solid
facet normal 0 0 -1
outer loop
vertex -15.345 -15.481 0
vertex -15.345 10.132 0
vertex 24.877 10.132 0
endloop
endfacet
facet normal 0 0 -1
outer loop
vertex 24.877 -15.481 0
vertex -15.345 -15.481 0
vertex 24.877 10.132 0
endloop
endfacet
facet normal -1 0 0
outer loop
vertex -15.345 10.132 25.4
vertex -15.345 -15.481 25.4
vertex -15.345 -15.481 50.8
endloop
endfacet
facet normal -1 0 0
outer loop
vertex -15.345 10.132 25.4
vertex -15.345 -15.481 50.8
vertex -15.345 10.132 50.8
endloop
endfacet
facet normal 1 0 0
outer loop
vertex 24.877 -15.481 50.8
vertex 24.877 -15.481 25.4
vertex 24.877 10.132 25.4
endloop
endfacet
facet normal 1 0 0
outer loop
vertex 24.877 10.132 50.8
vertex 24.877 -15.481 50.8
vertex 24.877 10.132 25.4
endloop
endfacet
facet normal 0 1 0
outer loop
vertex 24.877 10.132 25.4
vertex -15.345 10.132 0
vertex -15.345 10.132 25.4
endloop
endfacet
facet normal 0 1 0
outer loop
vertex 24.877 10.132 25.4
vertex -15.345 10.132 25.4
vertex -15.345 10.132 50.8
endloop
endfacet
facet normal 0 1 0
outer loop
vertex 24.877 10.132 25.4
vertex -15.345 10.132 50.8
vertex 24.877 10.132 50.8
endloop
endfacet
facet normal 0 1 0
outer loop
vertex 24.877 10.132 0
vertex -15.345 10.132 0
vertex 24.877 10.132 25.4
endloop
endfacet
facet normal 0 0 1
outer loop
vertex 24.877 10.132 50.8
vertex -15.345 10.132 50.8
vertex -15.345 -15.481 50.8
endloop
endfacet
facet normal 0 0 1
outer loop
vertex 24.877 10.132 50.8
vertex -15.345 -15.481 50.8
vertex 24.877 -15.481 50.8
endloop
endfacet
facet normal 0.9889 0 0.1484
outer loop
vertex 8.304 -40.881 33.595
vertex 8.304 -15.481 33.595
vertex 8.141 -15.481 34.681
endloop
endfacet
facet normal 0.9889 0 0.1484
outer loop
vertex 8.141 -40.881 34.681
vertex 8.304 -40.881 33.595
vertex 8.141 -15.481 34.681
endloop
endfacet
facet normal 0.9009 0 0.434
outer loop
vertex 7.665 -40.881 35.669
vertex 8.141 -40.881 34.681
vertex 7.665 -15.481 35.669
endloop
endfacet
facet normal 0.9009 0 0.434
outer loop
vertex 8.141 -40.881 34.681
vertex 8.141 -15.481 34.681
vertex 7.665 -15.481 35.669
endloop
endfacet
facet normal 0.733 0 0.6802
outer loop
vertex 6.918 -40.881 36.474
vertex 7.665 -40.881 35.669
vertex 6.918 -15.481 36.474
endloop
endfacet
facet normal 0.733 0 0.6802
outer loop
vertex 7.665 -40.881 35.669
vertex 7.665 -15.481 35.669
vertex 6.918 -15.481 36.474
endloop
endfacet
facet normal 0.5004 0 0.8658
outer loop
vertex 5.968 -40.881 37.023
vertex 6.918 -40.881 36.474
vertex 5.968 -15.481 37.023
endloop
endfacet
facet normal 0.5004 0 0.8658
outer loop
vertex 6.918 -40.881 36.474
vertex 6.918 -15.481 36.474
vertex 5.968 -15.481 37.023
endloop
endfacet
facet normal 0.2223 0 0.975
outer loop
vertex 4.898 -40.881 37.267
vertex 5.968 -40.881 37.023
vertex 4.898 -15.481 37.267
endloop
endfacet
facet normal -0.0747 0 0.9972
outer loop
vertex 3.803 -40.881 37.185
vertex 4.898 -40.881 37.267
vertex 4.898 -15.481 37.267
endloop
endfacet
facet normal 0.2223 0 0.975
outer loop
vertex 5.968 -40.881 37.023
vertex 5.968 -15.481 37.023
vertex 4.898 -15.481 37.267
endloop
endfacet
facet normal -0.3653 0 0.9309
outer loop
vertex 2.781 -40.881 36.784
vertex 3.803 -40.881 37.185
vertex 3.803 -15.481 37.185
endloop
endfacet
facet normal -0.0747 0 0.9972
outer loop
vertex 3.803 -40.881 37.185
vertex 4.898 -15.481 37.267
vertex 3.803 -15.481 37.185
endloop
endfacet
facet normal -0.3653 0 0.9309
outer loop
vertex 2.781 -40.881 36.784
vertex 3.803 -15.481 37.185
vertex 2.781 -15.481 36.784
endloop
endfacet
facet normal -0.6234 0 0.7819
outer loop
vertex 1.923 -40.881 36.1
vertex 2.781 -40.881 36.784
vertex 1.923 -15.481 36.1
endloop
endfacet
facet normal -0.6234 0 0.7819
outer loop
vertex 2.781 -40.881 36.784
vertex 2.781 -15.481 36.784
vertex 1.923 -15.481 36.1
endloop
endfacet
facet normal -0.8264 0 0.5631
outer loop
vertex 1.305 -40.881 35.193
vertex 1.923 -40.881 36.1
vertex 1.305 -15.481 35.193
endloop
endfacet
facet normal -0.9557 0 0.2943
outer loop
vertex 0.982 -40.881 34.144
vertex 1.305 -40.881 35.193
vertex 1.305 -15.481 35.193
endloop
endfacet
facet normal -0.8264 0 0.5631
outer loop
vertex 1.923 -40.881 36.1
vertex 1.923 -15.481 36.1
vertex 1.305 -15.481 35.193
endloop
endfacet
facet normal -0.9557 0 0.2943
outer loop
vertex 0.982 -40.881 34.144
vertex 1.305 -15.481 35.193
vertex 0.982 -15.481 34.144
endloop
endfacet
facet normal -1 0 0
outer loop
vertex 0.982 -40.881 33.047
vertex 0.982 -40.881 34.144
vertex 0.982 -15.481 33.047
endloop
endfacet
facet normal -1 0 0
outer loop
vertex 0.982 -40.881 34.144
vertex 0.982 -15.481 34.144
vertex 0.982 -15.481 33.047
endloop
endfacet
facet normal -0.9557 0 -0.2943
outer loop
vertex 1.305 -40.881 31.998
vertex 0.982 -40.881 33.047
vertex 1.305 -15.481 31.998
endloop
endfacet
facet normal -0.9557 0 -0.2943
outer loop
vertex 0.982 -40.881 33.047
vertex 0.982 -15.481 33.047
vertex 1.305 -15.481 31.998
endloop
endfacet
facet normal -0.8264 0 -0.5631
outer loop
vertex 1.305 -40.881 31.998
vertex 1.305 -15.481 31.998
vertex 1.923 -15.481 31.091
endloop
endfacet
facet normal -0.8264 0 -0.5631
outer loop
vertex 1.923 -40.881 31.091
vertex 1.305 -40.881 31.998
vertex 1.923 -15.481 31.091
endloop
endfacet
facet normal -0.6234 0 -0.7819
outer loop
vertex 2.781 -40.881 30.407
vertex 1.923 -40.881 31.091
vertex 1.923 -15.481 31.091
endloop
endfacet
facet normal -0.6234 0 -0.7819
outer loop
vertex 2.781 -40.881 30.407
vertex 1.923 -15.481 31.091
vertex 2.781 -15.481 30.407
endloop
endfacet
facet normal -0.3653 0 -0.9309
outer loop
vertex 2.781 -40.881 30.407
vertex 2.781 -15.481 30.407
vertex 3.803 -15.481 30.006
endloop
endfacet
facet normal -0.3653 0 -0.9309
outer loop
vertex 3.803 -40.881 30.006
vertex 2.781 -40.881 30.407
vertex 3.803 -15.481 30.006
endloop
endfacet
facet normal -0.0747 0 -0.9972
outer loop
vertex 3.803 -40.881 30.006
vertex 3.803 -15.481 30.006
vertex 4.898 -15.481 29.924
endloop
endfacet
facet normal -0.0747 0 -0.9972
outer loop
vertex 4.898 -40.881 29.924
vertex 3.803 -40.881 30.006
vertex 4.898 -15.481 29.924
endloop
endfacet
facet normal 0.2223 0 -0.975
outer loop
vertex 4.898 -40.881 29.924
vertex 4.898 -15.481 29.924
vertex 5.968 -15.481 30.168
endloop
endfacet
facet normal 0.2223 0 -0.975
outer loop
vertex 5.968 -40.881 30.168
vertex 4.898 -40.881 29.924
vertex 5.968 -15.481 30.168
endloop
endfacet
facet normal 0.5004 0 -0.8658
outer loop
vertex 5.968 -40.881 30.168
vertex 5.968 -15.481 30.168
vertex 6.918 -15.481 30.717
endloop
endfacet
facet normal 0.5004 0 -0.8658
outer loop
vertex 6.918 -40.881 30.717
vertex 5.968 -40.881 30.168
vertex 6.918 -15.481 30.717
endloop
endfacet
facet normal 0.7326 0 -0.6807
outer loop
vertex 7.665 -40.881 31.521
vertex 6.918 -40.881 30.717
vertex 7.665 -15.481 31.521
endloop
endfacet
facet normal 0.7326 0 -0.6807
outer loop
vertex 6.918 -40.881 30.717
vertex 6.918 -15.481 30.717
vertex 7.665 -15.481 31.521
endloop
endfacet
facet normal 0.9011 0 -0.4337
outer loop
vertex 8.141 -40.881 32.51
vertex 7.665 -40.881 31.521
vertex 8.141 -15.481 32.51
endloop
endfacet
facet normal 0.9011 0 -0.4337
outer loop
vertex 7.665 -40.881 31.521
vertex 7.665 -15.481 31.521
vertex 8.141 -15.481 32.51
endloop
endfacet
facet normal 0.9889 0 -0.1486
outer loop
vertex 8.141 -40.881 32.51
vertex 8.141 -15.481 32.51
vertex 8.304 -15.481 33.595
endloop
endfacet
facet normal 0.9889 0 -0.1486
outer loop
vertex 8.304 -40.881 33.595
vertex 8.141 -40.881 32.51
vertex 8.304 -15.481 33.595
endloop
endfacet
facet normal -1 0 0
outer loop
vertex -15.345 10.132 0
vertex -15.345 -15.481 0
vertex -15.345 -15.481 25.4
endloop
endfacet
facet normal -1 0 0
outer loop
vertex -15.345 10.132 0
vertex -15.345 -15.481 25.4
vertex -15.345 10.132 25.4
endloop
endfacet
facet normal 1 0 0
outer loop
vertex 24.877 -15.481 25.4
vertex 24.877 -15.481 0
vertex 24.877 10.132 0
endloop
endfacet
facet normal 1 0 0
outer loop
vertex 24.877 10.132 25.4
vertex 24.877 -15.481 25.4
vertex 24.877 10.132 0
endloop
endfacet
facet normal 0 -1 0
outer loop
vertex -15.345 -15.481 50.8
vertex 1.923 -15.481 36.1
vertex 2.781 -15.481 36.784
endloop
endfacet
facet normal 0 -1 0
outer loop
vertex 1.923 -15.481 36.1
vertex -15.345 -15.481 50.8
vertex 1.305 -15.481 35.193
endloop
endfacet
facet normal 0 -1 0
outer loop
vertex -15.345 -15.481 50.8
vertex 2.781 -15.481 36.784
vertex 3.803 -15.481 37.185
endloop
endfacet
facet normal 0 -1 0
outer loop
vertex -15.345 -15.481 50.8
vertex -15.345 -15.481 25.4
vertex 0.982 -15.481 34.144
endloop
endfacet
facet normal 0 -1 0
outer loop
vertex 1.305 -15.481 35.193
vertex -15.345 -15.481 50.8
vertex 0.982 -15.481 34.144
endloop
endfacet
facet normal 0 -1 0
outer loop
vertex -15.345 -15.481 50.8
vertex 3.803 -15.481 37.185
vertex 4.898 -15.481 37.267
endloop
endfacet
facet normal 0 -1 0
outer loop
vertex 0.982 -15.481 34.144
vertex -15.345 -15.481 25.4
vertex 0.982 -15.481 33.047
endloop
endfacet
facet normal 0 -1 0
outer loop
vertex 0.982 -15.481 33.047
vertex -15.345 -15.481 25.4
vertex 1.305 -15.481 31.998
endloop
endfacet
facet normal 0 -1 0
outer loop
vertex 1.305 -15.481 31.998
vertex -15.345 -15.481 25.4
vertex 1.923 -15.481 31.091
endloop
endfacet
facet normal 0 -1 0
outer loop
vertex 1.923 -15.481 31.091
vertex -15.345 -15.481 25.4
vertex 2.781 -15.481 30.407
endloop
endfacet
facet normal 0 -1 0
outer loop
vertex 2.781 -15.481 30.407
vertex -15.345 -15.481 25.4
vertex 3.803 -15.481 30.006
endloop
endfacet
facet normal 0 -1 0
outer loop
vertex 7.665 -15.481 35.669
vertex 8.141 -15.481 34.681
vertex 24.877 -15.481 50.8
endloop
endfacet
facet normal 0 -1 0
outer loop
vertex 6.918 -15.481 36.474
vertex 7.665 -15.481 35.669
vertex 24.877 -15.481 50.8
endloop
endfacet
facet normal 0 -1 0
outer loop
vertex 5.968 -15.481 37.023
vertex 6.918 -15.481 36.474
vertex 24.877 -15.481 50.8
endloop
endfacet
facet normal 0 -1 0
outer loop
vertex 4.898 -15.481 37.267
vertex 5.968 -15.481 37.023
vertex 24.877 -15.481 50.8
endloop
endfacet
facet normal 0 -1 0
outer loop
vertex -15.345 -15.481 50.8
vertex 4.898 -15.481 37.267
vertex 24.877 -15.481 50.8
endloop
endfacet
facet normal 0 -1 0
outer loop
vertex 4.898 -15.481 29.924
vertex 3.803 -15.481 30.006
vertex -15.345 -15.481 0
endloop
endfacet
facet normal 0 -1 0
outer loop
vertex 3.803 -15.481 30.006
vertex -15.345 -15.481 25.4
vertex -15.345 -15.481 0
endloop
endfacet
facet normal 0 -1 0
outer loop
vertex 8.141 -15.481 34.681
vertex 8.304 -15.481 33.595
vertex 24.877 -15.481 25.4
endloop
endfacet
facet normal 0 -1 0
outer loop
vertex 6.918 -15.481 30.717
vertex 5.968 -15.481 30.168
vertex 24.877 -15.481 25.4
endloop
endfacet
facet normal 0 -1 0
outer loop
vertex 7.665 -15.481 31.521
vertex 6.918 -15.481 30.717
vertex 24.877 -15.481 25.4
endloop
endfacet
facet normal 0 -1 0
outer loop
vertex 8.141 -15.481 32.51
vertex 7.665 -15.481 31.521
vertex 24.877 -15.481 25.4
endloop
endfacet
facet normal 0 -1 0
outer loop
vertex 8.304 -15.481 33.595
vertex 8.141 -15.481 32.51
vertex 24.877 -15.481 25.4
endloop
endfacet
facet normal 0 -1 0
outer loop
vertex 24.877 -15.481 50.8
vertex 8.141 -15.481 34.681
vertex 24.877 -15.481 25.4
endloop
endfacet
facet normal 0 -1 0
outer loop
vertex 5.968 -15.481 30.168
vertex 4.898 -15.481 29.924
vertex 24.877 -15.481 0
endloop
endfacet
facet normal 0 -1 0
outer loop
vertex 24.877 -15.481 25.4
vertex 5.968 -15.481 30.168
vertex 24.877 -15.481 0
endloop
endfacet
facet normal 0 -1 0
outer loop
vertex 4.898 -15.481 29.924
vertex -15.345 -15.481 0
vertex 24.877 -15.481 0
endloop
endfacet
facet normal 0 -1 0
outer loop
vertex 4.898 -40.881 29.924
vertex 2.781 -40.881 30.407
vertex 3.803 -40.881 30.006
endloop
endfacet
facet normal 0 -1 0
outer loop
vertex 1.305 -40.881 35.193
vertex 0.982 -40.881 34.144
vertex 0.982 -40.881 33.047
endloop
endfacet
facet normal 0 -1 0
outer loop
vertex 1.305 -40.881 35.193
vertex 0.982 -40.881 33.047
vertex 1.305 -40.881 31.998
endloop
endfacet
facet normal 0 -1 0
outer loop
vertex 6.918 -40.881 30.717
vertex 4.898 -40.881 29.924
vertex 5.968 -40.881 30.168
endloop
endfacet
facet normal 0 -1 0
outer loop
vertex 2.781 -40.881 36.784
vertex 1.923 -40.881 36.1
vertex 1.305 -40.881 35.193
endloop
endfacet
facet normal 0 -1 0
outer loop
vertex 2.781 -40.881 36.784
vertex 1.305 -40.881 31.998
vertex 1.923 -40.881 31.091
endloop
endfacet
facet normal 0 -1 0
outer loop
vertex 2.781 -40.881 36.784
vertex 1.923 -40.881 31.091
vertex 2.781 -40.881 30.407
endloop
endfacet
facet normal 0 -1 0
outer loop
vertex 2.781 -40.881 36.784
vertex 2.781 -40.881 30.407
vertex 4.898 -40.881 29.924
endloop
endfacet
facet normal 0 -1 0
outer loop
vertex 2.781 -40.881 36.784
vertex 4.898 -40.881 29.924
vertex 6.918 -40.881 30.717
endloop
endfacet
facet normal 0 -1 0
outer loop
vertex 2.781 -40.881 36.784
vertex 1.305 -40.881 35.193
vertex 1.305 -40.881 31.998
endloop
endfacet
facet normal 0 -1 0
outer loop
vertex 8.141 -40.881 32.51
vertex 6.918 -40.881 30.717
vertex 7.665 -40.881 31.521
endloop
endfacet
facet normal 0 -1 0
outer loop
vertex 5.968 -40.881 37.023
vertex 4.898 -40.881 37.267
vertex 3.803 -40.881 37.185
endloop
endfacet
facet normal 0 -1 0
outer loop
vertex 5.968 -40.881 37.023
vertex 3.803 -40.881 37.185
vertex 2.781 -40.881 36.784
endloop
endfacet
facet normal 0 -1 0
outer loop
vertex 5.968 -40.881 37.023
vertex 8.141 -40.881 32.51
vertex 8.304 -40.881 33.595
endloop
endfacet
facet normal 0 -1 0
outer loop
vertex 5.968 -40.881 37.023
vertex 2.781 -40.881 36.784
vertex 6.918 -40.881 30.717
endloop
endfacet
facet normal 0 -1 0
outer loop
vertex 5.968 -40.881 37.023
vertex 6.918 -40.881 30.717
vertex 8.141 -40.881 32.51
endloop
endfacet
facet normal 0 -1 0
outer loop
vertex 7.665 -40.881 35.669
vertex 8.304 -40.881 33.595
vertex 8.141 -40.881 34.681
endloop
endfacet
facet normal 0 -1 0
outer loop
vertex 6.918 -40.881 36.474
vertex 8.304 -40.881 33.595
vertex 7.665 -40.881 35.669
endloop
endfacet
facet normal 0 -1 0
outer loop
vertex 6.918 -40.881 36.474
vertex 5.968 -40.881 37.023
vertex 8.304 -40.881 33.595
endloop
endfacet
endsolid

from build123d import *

# Parameters (mm, degrees)
F0_W      = 40.221851
F0_H      = 25.612304
F1_DEPTH  = 25.4
F1_FACE_W = 40.22185
F1_FACE_H = 25.612304
F2_DEPTH  = 25.4
F3_R      = 3.681994
F4_DEPTH  = 25.4


with BuildPart() as f1:
    # F0 (on Top) → F1 (new body)
    with BuildSketch(Plane.XY):
        with Locations((4.765831, -2.674487)):
            Rectangle(F0_W, F0_H)
    extrude(amount=F1_DEPTH)

    # F1_face (on face) → F2 (join)
    with BuildSketch(Plane(origin=(4.765831, -2.674487, 25.4), x_dir=(1, 0, 0), z_dir=(0, 0, 1))):
        Rectangle(F1_FACE_W, F1_FACE_H)
    extrude(amount=F2_DEPTH)

    # F3 (on face) → F4 (join)
    with BuildSketch(Plane.XZ.offset(15.480639)):
        with Locations((4.6224, 33.59535)):
            Circle(F3_R)
    extrude(amount=F4_DEPTH)


solid = f1.part
